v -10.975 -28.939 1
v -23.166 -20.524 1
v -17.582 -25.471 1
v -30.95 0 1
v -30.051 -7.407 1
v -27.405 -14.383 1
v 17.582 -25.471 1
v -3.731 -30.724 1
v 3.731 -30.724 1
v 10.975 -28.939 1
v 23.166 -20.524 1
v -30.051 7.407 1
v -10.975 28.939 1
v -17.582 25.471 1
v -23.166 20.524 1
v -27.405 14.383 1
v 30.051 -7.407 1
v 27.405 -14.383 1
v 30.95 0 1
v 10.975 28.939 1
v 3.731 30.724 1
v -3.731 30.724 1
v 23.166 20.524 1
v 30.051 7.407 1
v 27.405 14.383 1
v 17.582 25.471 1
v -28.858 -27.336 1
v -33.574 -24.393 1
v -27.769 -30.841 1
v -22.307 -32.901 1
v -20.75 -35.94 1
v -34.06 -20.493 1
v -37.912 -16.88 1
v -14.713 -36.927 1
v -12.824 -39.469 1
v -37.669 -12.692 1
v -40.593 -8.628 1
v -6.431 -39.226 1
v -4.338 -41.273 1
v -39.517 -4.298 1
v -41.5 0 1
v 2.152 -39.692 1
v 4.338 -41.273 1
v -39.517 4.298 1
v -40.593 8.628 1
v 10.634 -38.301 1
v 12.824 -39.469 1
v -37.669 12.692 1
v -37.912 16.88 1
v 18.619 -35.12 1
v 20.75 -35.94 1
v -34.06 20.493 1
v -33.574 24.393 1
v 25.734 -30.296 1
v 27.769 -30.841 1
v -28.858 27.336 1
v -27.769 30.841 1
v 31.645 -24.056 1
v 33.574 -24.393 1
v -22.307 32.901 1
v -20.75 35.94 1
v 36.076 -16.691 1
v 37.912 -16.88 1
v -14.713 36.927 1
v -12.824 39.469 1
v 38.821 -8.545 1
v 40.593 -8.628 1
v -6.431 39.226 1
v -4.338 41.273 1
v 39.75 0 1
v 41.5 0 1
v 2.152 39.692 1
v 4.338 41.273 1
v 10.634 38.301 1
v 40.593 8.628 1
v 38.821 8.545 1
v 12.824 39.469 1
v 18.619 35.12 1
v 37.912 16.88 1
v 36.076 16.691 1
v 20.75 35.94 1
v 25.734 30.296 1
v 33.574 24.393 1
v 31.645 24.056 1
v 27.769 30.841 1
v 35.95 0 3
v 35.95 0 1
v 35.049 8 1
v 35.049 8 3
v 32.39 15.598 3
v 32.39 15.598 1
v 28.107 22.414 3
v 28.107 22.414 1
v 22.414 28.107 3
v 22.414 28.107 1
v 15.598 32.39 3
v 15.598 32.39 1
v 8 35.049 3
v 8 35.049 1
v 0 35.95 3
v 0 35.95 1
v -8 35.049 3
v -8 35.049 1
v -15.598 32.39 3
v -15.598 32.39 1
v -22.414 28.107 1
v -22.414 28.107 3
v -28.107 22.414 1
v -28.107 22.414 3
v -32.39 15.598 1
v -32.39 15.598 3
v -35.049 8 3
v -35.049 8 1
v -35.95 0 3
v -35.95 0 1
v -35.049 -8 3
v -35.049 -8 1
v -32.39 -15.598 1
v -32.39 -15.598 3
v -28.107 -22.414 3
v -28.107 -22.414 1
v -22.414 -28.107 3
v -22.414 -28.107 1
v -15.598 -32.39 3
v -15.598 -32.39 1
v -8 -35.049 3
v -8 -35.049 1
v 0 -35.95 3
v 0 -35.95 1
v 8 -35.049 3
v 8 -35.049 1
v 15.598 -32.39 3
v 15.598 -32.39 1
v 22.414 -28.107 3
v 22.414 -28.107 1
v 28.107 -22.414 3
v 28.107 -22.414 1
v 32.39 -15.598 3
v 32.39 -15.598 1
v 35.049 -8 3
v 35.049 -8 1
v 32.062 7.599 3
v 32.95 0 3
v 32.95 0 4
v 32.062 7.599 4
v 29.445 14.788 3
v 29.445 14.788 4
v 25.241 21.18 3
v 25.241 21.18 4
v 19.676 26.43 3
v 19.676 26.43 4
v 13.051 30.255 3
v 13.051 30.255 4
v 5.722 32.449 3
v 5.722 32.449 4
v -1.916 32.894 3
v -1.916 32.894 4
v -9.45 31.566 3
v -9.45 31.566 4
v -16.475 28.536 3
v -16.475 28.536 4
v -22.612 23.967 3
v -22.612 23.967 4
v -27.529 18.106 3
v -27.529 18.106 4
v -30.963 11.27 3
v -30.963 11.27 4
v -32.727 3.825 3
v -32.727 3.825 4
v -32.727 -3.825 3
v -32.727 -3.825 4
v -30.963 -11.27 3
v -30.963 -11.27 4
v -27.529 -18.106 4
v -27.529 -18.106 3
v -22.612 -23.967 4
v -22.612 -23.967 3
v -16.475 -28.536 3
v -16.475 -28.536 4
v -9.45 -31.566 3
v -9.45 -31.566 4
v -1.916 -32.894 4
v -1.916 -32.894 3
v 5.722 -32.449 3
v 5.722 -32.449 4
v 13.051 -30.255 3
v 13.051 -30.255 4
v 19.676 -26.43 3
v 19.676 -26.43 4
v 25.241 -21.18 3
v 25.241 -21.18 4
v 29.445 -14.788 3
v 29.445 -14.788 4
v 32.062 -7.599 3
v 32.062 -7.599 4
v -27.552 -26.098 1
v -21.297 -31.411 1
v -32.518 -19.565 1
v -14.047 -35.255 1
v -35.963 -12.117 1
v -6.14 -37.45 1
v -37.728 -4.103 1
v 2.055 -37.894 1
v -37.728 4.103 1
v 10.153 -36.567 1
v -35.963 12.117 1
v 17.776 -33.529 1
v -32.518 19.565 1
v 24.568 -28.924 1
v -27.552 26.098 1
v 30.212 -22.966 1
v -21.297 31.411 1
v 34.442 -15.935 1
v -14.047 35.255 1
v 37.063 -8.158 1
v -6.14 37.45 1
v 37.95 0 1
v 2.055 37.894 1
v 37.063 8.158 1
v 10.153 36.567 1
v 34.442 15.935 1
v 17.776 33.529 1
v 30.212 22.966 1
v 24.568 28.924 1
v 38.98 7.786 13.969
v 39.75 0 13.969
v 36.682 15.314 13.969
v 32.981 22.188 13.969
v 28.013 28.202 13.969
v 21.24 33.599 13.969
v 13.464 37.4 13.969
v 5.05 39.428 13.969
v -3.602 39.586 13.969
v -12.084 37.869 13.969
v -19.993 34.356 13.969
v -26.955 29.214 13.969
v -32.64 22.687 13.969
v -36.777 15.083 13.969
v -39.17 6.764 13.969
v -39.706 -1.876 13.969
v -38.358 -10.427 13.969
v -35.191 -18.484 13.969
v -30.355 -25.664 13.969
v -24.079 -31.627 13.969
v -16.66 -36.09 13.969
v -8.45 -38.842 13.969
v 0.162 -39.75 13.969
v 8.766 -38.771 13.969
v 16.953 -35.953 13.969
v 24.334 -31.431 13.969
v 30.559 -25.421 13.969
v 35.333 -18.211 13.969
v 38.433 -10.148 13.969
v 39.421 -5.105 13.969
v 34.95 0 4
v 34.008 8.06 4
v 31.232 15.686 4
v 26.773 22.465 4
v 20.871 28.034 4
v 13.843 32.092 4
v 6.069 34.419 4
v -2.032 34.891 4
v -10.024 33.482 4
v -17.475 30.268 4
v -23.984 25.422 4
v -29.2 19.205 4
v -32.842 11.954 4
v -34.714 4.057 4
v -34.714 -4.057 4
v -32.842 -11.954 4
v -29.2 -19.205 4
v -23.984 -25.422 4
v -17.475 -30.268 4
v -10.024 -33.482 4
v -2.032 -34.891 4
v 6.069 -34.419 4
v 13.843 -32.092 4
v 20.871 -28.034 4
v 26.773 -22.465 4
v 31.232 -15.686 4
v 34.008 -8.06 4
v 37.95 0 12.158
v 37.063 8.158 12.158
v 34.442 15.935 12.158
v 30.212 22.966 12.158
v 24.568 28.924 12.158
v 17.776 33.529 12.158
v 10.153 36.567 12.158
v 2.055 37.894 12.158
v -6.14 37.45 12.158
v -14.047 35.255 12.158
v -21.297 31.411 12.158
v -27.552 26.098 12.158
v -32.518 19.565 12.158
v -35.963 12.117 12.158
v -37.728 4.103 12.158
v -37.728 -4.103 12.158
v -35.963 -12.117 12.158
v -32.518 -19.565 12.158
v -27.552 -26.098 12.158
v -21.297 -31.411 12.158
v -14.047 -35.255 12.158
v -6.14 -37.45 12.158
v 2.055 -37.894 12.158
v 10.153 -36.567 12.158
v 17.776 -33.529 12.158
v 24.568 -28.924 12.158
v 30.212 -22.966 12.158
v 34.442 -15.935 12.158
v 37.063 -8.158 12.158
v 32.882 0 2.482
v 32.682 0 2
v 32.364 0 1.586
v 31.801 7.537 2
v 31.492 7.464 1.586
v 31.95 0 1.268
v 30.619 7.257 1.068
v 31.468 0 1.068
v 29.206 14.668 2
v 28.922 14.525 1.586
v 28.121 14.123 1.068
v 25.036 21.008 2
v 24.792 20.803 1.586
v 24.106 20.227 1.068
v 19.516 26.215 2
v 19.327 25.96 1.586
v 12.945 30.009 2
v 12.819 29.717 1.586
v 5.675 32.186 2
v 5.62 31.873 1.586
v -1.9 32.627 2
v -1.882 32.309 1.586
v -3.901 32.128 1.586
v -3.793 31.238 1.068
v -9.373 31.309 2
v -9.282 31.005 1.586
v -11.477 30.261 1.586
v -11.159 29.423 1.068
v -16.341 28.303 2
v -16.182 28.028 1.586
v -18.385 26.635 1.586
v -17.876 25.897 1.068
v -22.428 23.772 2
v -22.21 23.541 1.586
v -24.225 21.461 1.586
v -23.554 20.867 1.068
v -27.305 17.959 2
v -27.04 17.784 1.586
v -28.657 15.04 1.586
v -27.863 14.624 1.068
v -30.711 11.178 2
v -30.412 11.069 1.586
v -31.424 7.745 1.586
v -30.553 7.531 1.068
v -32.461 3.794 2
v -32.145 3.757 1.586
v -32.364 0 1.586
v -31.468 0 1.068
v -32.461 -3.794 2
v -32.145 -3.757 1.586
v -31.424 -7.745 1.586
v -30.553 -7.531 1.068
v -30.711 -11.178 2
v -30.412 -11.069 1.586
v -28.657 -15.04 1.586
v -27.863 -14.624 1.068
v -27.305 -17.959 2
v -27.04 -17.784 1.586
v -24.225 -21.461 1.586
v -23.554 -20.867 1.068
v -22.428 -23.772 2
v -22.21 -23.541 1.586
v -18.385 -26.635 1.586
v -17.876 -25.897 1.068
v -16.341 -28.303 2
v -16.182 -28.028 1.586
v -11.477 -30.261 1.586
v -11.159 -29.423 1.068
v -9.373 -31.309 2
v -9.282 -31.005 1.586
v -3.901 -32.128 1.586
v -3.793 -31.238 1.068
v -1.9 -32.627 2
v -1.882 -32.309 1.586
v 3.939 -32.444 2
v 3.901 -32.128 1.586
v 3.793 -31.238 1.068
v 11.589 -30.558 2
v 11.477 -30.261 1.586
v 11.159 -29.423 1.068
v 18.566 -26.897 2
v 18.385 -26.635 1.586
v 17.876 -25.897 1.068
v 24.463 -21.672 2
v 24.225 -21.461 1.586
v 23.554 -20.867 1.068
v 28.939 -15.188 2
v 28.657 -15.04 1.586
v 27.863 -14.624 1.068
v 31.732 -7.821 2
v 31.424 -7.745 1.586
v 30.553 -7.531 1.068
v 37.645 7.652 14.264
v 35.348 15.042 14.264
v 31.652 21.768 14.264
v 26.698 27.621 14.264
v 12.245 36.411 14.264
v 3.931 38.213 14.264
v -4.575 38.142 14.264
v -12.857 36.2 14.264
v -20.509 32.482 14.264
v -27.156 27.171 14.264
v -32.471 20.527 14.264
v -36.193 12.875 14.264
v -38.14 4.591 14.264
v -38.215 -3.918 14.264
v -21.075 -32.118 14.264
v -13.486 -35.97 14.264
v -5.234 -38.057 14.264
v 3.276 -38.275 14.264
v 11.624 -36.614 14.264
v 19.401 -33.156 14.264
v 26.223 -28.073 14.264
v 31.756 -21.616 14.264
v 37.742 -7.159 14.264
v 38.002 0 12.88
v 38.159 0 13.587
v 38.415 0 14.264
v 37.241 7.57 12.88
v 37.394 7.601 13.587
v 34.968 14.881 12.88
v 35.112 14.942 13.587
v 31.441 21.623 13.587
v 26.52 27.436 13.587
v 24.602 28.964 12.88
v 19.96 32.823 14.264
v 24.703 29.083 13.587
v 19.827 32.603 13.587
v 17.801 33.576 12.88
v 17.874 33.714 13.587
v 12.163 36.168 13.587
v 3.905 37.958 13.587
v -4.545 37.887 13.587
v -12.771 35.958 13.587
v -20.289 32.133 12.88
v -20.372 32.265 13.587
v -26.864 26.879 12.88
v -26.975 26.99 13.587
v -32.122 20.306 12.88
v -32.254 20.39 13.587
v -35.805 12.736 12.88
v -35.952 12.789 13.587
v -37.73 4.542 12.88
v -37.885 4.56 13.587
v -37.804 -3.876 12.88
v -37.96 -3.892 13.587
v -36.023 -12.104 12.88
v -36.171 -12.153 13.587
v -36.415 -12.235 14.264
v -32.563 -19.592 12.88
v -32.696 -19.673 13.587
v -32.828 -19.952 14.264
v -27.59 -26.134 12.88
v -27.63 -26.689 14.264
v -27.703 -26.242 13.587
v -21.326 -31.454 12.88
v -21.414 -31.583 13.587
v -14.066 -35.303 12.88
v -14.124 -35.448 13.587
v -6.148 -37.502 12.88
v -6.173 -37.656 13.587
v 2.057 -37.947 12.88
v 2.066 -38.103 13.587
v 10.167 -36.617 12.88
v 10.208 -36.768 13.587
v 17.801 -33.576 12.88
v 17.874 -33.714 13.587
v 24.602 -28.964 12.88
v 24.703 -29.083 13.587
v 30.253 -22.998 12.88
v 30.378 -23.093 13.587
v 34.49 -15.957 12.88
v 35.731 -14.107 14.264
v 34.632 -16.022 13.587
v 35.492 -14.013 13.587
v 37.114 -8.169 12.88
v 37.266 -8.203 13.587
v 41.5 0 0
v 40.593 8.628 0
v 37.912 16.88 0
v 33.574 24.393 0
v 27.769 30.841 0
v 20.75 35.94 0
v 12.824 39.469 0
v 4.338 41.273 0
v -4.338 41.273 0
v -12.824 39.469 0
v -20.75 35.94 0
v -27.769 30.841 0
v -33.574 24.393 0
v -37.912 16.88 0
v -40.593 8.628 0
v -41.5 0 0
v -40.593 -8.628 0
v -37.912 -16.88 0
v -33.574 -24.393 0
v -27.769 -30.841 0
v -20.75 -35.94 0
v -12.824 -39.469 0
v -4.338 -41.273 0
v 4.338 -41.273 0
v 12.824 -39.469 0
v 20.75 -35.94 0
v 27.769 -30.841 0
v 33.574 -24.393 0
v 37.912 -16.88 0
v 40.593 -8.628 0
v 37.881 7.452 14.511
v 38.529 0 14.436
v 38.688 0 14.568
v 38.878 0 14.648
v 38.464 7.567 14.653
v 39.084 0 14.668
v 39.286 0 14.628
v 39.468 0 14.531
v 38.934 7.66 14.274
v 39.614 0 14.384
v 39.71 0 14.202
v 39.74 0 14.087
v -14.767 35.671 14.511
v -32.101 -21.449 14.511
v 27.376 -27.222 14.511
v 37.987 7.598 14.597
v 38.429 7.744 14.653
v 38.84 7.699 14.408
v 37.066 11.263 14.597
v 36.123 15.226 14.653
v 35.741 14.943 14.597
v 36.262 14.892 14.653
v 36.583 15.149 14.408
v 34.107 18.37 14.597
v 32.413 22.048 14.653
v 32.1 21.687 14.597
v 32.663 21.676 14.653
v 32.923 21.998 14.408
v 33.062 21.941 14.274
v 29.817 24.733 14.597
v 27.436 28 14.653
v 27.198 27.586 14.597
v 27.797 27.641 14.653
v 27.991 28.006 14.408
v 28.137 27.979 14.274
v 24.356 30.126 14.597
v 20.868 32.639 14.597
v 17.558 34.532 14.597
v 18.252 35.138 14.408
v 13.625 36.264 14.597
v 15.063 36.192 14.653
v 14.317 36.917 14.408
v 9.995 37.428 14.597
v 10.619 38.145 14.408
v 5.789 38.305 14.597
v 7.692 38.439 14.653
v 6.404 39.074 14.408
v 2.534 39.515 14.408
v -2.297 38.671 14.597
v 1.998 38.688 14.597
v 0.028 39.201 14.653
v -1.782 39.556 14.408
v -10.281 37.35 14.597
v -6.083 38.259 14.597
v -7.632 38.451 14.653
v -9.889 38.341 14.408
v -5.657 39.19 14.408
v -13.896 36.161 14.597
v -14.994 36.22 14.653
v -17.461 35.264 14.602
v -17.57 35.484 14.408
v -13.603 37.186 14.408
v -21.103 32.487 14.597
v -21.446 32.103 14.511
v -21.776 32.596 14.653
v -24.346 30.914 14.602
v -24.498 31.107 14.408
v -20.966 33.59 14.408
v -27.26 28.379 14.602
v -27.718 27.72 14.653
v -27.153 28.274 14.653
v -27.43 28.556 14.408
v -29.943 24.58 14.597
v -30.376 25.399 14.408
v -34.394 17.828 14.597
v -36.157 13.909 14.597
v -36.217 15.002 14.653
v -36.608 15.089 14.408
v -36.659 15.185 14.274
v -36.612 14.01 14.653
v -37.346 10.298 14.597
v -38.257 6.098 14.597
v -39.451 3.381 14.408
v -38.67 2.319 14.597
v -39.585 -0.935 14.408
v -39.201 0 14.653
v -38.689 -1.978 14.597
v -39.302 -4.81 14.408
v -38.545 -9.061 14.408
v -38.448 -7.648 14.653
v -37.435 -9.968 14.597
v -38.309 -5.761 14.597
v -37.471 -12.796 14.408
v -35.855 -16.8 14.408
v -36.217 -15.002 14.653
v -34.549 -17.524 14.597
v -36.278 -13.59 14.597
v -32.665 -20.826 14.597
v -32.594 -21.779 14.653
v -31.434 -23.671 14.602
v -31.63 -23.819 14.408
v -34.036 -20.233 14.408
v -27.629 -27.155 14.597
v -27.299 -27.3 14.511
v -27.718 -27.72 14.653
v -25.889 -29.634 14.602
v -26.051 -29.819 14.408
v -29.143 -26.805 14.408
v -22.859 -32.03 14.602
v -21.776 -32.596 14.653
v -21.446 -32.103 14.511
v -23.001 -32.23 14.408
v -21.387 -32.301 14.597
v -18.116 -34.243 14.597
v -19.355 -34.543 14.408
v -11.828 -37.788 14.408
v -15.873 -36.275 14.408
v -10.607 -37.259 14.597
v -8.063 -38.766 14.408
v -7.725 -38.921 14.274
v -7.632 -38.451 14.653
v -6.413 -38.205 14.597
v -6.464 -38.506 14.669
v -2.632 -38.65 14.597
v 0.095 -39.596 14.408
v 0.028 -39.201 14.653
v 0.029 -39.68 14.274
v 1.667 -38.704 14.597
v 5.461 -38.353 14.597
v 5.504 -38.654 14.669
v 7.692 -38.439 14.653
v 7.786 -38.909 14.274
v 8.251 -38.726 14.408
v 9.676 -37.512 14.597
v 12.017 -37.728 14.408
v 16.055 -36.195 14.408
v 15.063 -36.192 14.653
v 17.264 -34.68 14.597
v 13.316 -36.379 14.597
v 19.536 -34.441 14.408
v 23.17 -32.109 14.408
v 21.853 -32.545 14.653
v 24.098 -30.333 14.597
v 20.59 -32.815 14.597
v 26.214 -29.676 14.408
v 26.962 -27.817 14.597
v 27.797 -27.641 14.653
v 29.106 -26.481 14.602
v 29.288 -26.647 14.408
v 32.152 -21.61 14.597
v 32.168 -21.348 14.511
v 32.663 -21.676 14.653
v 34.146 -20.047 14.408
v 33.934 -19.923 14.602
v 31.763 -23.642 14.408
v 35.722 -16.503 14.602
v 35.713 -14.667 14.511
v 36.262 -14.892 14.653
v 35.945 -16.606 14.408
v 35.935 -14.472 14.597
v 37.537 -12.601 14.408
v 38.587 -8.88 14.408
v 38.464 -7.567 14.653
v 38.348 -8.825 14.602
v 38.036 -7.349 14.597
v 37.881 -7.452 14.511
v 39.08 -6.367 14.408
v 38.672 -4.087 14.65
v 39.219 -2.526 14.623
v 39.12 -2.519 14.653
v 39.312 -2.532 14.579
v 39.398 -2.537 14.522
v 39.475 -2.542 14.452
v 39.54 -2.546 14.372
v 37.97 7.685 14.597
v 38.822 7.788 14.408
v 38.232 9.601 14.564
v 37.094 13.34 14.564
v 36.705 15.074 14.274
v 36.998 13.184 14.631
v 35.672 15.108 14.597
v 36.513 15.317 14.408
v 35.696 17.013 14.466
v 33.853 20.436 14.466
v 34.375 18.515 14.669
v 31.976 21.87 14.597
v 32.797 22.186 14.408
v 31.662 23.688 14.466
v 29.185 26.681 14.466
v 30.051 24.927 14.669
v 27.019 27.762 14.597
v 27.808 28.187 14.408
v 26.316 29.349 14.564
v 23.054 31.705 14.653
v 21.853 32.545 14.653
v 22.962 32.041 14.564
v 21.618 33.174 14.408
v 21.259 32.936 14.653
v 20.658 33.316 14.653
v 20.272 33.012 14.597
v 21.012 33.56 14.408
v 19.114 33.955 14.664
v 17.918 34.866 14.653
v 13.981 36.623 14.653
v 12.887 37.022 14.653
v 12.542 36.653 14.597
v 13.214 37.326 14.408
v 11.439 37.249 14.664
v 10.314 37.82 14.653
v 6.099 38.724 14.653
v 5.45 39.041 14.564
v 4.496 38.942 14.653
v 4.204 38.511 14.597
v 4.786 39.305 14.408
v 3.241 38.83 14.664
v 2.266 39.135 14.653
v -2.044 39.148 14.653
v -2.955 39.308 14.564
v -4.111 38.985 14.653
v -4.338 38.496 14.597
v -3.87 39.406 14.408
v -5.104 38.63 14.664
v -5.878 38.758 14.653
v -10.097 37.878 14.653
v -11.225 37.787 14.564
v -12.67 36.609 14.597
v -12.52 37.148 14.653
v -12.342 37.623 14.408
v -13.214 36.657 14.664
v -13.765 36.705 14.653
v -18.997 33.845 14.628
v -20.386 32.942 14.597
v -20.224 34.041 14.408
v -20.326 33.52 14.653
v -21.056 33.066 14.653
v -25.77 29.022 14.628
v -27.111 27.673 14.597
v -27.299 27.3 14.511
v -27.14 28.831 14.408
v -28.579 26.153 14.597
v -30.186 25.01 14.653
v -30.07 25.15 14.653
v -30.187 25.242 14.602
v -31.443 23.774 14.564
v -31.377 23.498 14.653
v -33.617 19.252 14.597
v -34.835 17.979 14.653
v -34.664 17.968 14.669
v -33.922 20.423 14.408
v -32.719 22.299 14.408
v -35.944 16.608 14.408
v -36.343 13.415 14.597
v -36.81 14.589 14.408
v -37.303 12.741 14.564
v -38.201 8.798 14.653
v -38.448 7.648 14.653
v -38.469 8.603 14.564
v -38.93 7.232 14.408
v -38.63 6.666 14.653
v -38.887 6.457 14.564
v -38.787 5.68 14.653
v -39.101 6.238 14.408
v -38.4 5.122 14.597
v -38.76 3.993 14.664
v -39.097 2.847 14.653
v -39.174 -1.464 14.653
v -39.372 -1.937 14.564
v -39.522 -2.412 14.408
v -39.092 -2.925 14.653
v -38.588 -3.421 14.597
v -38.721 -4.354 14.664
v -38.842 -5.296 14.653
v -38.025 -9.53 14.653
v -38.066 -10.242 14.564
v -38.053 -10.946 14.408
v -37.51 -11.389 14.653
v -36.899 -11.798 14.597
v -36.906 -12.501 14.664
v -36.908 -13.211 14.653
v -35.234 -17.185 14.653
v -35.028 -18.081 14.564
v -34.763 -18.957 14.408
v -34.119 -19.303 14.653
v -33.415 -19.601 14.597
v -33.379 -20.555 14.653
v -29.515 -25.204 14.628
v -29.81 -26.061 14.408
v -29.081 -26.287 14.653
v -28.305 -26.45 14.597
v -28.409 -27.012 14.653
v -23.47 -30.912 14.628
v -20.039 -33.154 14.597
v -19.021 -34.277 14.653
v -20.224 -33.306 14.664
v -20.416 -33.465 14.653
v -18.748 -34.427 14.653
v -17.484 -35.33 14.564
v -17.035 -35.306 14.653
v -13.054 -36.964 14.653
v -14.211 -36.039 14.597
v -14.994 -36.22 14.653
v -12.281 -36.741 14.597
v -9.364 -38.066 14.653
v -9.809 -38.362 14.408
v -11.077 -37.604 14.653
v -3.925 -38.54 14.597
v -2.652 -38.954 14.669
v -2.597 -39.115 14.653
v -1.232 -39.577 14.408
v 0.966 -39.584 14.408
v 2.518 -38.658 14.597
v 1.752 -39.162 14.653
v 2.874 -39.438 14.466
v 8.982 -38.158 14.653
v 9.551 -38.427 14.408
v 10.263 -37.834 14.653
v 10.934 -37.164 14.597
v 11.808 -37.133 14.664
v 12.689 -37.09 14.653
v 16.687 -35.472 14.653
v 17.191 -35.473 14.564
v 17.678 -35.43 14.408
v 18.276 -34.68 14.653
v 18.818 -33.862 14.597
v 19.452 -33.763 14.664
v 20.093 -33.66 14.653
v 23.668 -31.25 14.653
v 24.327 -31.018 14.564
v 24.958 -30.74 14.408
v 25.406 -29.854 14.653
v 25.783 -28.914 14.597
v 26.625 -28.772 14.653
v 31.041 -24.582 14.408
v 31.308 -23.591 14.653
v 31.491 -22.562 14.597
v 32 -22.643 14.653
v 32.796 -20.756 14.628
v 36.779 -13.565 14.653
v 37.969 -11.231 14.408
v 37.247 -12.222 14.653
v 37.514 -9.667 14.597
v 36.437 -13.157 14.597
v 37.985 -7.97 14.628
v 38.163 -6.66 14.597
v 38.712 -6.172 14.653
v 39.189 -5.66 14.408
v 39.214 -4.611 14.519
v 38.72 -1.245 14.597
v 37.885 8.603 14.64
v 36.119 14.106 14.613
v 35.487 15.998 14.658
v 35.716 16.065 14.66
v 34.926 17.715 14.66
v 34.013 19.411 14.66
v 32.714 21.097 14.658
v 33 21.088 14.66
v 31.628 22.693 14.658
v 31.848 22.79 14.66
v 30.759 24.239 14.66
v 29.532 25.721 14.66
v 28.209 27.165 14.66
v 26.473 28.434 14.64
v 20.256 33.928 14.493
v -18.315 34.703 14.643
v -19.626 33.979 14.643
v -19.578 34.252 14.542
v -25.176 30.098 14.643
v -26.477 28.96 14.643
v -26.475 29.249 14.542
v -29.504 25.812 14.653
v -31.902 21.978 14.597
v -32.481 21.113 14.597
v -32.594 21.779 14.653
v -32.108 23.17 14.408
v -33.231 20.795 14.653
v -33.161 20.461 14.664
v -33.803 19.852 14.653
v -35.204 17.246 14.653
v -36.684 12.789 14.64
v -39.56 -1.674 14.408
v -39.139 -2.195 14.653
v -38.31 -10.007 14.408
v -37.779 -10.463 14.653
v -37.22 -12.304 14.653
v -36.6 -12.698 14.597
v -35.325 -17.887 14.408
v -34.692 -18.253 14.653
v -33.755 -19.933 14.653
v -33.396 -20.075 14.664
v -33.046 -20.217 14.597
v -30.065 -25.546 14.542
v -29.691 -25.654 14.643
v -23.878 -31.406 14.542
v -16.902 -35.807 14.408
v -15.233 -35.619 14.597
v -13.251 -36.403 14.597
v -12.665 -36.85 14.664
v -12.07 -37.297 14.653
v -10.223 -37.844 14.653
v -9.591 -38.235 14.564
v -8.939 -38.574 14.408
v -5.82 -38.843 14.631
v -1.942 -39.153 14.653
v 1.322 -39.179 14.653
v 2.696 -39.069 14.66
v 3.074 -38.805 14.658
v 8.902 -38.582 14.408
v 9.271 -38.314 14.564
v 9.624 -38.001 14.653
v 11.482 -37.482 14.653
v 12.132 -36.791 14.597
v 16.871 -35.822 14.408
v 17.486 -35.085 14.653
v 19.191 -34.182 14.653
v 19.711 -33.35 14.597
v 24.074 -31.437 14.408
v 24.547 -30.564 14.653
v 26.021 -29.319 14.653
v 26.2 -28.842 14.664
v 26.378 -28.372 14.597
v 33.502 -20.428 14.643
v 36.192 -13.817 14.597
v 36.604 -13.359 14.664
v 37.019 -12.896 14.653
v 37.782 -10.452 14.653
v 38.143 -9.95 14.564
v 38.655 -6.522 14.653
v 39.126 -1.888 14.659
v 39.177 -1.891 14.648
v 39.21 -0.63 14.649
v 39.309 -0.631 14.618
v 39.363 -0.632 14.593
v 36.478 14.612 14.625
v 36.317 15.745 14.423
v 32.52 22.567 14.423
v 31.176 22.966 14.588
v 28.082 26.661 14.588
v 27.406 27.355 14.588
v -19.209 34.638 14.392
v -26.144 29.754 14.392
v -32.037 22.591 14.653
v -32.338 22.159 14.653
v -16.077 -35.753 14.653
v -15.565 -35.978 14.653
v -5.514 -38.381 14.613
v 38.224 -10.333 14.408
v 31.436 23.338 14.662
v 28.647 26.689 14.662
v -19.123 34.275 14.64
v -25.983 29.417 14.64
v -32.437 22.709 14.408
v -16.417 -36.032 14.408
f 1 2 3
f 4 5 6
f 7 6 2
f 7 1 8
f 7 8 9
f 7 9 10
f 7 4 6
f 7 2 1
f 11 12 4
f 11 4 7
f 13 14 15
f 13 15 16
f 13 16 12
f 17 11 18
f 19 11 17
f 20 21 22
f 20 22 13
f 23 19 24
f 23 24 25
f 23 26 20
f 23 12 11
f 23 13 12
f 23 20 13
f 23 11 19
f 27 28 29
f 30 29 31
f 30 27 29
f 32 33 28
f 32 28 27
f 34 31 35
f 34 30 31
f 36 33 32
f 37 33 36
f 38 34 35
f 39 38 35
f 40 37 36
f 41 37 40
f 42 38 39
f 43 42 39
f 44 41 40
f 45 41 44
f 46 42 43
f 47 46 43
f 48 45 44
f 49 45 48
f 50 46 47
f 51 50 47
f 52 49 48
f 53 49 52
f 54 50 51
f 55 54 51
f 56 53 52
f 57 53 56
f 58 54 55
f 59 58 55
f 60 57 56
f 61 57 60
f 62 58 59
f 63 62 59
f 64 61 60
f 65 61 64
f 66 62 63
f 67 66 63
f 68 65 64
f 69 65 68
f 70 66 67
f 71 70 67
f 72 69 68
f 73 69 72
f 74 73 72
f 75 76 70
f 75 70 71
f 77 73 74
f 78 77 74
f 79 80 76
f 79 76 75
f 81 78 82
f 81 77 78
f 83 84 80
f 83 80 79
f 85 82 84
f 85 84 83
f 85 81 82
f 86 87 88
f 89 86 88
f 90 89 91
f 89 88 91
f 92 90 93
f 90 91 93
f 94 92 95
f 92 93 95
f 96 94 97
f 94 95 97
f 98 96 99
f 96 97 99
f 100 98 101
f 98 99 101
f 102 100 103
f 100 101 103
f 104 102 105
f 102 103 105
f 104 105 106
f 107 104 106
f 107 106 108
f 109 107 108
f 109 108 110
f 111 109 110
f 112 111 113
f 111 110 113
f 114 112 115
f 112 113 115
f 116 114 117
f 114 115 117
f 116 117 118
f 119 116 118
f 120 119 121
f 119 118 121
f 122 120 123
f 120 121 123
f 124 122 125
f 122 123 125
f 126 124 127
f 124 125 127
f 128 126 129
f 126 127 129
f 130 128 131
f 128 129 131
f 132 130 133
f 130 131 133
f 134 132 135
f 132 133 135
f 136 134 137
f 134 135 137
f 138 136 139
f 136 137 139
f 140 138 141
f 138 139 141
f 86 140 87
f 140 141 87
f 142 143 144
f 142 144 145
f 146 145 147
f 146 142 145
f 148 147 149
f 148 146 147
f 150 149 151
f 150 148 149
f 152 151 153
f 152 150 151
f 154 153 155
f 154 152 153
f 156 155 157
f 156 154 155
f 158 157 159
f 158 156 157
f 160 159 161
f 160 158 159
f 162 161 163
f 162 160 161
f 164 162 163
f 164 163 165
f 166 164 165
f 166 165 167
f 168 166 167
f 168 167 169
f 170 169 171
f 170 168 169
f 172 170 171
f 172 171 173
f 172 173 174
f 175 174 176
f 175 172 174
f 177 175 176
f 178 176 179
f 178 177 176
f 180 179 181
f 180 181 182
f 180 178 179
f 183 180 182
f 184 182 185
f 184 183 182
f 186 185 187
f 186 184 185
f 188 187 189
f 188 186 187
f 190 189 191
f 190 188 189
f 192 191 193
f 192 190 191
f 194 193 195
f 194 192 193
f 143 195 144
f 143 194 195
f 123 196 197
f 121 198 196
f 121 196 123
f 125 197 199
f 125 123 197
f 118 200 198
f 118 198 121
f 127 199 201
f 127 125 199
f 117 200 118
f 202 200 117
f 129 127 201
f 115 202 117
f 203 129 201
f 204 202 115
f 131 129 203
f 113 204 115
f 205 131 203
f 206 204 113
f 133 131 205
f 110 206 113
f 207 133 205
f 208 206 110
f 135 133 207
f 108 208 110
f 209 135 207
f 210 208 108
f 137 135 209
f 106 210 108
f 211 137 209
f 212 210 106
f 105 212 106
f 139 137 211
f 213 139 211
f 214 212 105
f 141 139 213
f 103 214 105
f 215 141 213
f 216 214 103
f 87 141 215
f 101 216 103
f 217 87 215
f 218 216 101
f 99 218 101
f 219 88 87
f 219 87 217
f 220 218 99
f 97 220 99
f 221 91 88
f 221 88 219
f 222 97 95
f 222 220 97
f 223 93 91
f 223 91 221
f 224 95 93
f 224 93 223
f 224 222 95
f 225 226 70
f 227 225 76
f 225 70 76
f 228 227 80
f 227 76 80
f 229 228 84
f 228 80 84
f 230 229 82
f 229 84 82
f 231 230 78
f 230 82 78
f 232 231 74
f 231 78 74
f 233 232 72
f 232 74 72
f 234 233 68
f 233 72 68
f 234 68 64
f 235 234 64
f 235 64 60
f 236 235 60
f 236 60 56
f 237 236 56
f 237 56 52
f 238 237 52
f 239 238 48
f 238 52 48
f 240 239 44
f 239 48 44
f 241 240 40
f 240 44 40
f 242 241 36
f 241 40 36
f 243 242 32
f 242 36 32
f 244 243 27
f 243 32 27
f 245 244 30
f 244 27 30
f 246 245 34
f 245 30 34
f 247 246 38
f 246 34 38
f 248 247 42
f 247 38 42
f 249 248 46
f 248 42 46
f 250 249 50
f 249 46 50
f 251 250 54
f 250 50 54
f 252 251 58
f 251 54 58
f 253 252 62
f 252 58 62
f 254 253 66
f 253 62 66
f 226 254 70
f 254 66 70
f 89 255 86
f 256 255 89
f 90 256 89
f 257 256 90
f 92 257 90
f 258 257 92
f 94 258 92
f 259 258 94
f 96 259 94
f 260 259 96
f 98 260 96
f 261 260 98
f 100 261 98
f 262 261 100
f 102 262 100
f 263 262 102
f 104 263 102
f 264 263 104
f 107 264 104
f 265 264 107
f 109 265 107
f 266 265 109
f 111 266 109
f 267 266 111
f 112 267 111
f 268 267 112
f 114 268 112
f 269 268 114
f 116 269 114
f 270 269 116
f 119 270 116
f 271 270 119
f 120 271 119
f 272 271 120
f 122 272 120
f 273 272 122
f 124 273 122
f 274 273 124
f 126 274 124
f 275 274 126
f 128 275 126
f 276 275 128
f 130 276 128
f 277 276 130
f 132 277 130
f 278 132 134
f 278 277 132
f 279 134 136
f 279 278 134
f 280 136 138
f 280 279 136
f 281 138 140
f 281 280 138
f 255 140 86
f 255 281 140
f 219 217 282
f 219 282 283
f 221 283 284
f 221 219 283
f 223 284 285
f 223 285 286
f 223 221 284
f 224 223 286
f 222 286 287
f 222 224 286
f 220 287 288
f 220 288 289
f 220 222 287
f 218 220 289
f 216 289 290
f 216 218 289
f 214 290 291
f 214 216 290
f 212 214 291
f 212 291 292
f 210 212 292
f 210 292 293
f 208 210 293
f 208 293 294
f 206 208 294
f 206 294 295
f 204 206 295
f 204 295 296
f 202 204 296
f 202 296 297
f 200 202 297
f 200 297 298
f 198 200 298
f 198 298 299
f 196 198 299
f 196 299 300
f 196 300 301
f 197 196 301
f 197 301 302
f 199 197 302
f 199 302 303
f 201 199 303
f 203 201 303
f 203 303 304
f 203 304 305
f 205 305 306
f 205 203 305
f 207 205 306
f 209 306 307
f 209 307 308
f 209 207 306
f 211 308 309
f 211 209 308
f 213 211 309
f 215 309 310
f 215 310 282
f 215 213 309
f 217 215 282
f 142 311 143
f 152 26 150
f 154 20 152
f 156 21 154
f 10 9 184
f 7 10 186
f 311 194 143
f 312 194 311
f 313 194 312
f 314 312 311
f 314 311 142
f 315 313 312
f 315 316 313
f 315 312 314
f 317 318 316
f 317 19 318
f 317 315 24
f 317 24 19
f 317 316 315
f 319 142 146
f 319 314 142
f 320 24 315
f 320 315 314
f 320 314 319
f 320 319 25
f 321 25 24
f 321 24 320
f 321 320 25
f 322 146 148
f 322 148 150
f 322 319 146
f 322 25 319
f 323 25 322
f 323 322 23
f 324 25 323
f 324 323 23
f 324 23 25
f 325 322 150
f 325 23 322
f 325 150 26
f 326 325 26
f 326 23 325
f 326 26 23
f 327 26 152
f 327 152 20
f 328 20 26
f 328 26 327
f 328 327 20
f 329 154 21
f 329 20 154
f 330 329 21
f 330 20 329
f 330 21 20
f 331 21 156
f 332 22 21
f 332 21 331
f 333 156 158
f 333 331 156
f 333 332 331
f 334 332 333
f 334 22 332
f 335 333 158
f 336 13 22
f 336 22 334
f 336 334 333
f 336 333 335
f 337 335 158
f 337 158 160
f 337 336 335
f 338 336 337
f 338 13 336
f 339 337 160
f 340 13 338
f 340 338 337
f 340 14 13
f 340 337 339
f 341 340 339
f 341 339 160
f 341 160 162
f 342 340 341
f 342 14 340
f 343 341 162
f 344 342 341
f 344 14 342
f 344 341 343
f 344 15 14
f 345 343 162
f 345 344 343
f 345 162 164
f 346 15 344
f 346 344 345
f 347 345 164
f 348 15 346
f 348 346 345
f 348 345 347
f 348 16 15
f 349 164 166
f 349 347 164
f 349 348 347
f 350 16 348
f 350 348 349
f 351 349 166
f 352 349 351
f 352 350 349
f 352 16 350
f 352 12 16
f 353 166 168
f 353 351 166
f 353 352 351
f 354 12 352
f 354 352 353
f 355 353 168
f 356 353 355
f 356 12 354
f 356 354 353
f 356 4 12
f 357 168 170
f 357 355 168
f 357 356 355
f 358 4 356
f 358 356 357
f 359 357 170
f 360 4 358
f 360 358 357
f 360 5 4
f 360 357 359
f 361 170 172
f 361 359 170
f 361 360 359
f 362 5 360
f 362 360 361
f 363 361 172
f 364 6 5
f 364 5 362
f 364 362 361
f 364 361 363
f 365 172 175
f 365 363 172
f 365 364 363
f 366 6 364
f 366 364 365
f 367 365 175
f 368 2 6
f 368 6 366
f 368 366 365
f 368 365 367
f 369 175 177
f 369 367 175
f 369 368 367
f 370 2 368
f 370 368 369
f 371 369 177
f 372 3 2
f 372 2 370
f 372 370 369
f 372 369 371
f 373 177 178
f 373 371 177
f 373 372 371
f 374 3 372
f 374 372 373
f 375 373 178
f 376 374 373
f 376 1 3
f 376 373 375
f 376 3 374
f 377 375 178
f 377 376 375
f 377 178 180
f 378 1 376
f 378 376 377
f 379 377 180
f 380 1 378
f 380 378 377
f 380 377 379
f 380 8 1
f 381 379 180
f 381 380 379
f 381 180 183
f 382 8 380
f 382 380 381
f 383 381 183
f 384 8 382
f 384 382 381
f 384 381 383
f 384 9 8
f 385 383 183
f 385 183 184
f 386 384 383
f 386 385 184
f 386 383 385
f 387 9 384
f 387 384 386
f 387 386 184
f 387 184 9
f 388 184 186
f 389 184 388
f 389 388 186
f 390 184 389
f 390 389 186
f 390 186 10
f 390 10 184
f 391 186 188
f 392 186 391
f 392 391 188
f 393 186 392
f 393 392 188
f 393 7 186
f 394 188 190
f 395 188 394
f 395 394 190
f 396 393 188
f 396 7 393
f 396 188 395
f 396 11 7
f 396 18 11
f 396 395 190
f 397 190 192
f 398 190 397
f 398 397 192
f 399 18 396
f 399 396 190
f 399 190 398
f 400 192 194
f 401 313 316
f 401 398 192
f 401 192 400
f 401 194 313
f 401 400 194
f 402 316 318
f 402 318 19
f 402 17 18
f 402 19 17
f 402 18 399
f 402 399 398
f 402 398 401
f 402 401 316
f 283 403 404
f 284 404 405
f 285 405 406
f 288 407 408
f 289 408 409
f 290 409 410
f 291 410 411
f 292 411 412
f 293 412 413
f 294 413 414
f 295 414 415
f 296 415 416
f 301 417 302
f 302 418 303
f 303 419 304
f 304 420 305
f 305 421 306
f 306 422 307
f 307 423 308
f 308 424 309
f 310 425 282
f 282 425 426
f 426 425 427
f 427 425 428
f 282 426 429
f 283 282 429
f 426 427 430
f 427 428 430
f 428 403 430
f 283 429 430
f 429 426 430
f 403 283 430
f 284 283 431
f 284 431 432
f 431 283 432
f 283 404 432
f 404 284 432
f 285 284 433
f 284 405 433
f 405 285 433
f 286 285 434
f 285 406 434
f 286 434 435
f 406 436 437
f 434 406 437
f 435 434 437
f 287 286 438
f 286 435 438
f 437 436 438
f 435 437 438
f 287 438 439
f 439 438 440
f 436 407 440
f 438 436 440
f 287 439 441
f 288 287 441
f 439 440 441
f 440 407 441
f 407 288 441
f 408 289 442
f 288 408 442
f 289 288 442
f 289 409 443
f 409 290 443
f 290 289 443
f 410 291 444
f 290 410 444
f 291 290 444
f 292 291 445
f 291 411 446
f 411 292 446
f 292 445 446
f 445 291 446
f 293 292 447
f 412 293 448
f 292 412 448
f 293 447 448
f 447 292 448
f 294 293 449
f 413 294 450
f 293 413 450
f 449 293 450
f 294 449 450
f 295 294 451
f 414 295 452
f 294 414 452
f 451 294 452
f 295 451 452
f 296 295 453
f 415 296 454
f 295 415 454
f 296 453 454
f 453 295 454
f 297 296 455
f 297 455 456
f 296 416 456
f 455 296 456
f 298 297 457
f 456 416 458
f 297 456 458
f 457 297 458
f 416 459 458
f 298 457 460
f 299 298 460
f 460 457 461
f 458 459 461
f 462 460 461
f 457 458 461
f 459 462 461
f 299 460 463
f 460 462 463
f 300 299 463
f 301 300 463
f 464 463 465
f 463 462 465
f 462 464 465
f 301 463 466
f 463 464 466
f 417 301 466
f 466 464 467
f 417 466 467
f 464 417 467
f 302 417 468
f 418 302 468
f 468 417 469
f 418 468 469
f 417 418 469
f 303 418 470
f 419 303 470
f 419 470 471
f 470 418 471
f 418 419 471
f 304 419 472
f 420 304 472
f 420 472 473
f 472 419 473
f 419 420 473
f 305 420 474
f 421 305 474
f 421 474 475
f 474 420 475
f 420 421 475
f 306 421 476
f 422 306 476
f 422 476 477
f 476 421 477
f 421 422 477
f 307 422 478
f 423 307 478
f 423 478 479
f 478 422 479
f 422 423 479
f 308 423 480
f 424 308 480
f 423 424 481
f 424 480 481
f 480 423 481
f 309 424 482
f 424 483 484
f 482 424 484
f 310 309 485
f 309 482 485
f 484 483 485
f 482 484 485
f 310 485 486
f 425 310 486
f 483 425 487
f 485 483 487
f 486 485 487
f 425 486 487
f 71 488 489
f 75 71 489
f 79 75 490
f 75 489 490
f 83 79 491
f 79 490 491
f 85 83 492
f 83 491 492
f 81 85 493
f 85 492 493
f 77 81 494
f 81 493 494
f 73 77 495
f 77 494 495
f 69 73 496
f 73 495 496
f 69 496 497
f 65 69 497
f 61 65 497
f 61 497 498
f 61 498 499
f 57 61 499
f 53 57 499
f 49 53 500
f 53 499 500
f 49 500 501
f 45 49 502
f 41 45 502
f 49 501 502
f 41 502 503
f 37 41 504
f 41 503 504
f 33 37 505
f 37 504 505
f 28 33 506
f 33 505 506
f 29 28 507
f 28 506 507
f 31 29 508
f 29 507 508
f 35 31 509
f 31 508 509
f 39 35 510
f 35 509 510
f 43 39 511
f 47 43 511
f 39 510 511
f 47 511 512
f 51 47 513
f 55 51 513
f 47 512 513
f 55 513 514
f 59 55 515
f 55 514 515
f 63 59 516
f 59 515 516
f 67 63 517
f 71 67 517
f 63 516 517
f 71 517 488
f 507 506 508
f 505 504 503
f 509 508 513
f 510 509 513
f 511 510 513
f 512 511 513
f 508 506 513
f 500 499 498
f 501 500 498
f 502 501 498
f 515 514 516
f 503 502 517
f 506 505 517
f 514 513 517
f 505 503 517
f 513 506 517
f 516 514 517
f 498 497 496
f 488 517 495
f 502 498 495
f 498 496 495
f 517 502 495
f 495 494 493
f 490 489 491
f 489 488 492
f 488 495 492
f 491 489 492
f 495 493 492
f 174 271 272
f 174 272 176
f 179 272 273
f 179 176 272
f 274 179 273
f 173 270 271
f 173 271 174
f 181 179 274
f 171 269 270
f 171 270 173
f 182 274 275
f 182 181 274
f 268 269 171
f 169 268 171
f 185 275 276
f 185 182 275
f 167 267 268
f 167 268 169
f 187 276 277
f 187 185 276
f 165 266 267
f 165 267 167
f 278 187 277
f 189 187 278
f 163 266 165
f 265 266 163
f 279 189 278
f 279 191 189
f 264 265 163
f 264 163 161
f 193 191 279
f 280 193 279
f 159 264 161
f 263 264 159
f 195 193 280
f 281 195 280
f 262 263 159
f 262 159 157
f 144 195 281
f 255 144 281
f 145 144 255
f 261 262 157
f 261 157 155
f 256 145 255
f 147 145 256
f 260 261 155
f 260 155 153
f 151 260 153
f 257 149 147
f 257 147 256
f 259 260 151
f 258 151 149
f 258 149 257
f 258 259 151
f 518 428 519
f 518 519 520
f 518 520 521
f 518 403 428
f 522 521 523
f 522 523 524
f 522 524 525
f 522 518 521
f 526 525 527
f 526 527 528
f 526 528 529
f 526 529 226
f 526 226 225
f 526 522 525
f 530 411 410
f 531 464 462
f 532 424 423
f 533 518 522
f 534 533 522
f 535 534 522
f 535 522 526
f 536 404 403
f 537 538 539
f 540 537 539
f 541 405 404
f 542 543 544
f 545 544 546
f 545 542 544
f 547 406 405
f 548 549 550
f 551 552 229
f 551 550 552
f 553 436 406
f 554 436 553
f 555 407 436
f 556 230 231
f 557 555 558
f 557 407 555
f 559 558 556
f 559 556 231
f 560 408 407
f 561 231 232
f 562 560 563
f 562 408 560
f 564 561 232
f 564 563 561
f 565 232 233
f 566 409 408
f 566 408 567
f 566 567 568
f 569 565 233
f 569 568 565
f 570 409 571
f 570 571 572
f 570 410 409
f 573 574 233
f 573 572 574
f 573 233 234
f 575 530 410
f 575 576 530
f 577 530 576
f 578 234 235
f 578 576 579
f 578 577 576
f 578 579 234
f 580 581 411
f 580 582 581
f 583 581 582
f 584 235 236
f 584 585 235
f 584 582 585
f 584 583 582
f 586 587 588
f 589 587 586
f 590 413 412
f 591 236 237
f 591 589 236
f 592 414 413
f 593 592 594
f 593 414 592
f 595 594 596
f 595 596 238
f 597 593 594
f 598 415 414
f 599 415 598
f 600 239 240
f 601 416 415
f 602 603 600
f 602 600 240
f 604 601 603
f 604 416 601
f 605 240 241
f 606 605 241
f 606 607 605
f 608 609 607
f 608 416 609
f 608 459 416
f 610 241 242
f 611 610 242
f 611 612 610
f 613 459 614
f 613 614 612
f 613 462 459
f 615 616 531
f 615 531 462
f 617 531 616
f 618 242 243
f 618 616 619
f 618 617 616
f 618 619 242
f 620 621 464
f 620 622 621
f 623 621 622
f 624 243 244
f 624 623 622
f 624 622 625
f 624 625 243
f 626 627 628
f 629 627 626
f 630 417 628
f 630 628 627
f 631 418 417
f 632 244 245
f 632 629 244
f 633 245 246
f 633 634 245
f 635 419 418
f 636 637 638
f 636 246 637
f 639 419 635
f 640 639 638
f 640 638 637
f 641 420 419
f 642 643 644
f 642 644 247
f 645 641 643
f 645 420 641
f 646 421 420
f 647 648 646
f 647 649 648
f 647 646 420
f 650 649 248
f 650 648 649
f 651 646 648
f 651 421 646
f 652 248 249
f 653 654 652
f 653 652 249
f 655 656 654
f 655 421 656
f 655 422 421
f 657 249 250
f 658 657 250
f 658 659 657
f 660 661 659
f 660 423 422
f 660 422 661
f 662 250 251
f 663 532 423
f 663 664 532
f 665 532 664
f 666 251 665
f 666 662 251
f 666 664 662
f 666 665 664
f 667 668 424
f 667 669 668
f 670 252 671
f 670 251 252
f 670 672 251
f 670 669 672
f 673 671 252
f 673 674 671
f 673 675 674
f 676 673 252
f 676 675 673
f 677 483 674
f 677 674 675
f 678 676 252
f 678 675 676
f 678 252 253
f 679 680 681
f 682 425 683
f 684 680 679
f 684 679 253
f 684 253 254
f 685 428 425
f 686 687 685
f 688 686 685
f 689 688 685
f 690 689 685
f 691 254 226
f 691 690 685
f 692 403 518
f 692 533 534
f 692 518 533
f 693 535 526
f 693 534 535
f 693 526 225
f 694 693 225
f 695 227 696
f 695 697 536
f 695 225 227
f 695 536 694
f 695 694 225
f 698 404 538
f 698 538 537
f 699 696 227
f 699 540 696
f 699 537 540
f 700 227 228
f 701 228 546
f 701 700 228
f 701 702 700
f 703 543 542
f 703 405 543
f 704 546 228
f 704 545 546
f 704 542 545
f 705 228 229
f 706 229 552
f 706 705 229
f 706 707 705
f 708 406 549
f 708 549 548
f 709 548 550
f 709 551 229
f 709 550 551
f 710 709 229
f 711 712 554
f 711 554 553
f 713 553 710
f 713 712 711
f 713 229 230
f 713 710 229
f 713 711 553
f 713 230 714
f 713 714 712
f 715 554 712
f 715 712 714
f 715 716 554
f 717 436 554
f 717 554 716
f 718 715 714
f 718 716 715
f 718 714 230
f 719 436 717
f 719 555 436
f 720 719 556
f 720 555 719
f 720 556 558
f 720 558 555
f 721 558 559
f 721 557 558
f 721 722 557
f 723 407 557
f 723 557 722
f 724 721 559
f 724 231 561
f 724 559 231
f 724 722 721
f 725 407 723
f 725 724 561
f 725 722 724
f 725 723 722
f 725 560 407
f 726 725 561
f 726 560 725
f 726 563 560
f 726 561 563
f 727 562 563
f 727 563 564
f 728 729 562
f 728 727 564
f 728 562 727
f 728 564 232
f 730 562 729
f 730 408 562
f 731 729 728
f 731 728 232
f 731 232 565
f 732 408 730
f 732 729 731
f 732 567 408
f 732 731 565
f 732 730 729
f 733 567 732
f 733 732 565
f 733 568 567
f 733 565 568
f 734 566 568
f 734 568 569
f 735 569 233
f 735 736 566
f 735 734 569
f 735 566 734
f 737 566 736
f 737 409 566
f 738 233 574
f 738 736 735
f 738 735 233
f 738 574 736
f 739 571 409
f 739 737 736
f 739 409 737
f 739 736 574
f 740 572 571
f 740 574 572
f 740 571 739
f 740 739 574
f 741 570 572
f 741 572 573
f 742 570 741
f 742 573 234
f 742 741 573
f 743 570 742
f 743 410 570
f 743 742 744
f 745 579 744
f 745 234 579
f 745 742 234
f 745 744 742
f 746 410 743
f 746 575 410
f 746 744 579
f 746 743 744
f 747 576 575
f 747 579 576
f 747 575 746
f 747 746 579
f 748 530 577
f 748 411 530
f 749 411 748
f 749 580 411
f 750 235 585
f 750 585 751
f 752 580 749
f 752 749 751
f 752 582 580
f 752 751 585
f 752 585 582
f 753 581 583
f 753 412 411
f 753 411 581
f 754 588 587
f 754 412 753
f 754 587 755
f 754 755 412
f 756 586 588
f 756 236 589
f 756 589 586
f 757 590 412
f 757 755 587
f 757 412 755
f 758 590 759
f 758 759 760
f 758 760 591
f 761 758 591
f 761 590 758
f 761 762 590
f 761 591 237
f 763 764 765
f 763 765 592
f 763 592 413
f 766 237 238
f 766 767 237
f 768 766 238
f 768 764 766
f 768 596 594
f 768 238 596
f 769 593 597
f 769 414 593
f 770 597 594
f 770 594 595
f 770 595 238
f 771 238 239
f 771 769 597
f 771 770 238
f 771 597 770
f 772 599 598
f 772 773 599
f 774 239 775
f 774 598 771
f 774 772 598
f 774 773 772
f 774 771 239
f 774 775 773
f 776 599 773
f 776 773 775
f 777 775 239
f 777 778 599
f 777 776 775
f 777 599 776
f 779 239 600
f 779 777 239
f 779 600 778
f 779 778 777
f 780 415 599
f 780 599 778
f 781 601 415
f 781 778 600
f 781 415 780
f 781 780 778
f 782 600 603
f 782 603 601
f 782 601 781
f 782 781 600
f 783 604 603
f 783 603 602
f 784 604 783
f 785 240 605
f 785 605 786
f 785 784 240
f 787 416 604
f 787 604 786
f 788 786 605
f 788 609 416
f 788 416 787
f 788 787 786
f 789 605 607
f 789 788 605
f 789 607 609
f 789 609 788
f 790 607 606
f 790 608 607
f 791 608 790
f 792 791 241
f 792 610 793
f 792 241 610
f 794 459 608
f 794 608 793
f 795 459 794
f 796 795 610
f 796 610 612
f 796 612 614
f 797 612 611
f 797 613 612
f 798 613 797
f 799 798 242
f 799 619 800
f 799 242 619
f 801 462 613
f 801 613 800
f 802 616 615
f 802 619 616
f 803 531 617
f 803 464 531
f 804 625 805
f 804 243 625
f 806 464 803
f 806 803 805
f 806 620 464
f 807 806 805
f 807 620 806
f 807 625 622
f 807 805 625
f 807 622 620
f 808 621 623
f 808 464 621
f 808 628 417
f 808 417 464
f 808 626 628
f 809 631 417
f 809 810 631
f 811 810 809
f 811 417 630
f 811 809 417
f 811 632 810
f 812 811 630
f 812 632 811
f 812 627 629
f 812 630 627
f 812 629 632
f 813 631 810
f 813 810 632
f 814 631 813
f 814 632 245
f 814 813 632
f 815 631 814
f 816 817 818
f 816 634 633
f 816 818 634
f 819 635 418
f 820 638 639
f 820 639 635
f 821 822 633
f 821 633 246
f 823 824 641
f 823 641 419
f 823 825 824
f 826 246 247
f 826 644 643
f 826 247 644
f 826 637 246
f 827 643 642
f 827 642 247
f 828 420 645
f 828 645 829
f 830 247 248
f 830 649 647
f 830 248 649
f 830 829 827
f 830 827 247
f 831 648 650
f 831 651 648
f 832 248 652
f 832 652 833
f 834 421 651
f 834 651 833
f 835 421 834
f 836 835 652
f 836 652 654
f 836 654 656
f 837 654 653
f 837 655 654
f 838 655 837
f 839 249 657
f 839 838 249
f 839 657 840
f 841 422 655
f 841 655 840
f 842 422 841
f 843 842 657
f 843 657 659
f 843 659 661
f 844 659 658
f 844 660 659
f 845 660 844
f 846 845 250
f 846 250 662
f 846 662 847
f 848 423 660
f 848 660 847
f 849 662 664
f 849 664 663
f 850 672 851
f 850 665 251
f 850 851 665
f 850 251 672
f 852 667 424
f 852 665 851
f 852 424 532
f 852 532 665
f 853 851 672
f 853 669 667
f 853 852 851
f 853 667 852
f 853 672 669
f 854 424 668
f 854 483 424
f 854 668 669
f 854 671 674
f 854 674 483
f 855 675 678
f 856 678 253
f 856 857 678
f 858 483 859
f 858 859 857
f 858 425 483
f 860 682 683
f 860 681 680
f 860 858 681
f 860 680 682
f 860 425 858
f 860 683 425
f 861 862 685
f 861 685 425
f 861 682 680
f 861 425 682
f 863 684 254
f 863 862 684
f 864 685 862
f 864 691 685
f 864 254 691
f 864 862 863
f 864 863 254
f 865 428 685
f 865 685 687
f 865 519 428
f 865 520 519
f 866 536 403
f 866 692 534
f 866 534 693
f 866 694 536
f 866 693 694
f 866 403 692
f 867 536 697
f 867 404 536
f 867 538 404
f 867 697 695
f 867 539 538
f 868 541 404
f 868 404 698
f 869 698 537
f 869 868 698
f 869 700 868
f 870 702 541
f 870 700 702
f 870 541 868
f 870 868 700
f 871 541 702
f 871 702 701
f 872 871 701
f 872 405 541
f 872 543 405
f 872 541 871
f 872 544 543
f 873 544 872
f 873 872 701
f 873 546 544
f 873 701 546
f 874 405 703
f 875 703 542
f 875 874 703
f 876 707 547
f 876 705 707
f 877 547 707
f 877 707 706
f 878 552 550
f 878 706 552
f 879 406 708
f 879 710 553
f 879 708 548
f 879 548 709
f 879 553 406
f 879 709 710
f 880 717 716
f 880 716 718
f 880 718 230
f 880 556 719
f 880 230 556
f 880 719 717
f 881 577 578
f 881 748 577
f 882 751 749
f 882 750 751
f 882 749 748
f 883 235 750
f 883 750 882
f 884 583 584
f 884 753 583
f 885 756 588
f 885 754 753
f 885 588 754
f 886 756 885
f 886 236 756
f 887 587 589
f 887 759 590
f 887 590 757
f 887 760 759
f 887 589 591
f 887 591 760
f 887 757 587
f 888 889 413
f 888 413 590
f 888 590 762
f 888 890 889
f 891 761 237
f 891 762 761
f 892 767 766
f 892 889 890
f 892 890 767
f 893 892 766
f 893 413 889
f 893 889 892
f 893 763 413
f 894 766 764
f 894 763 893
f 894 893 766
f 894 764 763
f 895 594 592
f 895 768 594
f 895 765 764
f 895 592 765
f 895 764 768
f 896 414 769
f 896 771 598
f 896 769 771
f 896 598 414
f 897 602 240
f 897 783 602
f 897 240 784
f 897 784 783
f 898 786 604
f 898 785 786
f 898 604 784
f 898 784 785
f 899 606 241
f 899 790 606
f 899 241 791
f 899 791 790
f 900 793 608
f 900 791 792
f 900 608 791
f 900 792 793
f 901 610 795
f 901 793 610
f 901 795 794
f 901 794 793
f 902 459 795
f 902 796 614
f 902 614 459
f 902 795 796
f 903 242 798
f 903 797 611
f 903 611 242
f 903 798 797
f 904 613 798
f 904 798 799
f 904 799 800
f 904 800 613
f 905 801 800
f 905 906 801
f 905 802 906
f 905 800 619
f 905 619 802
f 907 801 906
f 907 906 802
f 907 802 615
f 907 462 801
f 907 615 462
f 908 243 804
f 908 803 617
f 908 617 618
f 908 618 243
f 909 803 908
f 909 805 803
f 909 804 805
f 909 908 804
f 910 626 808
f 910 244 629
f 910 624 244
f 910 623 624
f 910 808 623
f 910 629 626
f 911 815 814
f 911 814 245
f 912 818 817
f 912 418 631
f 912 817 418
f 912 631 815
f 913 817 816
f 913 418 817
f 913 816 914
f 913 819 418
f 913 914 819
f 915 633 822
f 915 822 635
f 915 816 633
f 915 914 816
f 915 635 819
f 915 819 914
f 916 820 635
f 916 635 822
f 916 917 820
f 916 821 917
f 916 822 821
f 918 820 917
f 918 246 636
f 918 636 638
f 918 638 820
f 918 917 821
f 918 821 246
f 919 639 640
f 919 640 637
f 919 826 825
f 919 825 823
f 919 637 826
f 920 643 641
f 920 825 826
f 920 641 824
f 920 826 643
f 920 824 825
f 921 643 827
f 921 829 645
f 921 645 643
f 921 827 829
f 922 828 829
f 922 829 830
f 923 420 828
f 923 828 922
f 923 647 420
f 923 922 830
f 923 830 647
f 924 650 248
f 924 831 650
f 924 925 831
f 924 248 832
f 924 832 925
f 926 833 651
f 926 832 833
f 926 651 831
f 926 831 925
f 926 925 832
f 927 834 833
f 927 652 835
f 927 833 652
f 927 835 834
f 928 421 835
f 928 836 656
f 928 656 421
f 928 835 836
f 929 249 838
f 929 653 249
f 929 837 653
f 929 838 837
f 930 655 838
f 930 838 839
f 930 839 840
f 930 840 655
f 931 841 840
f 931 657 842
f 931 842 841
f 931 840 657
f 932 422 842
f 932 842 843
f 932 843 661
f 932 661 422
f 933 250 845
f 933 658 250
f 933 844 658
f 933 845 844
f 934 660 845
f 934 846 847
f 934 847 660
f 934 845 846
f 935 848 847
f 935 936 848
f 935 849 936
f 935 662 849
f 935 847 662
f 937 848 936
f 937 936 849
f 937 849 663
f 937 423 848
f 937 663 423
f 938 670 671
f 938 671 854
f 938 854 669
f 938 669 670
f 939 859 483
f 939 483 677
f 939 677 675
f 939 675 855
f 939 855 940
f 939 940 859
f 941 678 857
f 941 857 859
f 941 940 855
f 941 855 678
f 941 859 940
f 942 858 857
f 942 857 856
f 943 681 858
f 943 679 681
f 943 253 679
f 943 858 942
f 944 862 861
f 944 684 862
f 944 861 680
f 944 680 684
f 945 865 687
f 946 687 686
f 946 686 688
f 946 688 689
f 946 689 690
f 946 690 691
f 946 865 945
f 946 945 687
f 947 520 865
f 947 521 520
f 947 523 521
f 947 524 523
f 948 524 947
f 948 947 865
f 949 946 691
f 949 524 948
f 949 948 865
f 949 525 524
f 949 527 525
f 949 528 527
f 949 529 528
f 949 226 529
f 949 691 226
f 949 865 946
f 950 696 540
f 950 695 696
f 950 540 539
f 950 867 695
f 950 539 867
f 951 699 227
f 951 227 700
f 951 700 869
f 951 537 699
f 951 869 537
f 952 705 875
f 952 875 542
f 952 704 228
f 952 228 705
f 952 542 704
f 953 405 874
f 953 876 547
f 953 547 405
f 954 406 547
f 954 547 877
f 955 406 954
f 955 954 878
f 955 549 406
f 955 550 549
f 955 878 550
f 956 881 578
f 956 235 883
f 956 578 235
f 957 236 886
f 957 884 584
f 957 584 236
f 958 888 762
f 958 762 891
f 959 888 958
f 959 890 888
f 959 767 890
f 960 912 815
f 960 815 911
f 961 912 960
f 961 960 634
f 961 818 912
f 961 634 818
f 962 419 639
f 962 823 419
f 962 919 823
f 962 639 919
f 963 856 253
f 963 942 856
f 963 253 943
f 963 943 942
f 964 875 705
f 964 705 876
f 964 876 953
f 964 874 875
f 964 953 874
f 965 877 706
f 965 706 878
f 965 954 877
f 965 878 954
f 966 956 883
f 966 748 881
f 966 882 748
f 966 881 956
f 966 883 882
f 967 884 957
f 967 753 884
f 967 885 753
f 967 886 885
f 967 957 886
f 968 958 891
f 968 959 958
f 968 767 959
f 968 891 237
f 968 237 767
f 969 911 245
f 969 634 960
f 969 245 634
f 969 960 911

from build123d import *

# Parameters (mm, degrees)
F0_R     = 41.5
F1_DEPTH = 1
F2_R     = 39.75
F2_R_2   = 37.95
F3_DEPTH = 15
F4_R     = 35.95
F4_R_2   = 32.95
F5_DEPTH = 3
F6_SIZE  = 1
F8_R     = 0.7
F9_R     = 2


# Not quite as in the source:
# - a fillet or chamfer that OpenCascade refuses, or shapes differently, is made with other operations: its cross-section is extruded or revolved along the edge and cut away or added


with BuildPart() as f1:
    # F0 (on Top) → F1 (new body)
    with BuildSketch(Plane.XY):
        Circle(F0_R)
    extrude(amount=F1_DEPTH)

    # F2 (on face) → F3 (join)
    with BuildSketch(Plane.XY.offset(1)):
        Circle(F2_R)
        Circle(F2_R_2, mode=Mode.SUBTRACT)
    extrude(amount=F3_DEPTH)

    # F4 (on face) → F5 (join)
    with BuildSketch(Plane.XY.offset(1)):
        Circle(F4_R)
        Circle(F4_R_2, mode=Mode.SUBTRACT)
    extrude(amount=F5_DEPTH)

    # F6
    f6_edges = [f1.edges().sort_by_distance(p)[0] for p in [
        (-35.95, 0, 4),
    ]]
    chamfer(f6_edges, length=F6_SIZE)

    # F7: fillet of radius 5 on 1 edges, made by hand

    # F7_s1 → F7_t2 (revolve, cut)
    with BuildSketch(Plane.XZ):
        with BuildLine():
            ThreePointArc((37.95, 12.1581254575), (38.4223074309, 14.2794458011), (39.75, 16))
            Line((39.75, 16), (37.95, 16))
            Line((37.95, 16), (37.95, 12.1581254575))
        make_face()
    revolve(axis=Axis((0, 0, 16), (0, 0, 1)), mode=Mode.SUBTRACT)

    # F8
    f8_edges = [f1.edges().sort_by_distance(p)[0] for p in [
        (-39.75, 0, 16),
    ]]
    fillet(f8_edges, radius=F8_R)

    # F9
    f9_edges = [f1.edges().sort_by_distance(p)[0] for p in [
        (-32.95, 0, 1),
    ]]
    fillet(f9_edges, radius=F9_R)


solid = f1.part
